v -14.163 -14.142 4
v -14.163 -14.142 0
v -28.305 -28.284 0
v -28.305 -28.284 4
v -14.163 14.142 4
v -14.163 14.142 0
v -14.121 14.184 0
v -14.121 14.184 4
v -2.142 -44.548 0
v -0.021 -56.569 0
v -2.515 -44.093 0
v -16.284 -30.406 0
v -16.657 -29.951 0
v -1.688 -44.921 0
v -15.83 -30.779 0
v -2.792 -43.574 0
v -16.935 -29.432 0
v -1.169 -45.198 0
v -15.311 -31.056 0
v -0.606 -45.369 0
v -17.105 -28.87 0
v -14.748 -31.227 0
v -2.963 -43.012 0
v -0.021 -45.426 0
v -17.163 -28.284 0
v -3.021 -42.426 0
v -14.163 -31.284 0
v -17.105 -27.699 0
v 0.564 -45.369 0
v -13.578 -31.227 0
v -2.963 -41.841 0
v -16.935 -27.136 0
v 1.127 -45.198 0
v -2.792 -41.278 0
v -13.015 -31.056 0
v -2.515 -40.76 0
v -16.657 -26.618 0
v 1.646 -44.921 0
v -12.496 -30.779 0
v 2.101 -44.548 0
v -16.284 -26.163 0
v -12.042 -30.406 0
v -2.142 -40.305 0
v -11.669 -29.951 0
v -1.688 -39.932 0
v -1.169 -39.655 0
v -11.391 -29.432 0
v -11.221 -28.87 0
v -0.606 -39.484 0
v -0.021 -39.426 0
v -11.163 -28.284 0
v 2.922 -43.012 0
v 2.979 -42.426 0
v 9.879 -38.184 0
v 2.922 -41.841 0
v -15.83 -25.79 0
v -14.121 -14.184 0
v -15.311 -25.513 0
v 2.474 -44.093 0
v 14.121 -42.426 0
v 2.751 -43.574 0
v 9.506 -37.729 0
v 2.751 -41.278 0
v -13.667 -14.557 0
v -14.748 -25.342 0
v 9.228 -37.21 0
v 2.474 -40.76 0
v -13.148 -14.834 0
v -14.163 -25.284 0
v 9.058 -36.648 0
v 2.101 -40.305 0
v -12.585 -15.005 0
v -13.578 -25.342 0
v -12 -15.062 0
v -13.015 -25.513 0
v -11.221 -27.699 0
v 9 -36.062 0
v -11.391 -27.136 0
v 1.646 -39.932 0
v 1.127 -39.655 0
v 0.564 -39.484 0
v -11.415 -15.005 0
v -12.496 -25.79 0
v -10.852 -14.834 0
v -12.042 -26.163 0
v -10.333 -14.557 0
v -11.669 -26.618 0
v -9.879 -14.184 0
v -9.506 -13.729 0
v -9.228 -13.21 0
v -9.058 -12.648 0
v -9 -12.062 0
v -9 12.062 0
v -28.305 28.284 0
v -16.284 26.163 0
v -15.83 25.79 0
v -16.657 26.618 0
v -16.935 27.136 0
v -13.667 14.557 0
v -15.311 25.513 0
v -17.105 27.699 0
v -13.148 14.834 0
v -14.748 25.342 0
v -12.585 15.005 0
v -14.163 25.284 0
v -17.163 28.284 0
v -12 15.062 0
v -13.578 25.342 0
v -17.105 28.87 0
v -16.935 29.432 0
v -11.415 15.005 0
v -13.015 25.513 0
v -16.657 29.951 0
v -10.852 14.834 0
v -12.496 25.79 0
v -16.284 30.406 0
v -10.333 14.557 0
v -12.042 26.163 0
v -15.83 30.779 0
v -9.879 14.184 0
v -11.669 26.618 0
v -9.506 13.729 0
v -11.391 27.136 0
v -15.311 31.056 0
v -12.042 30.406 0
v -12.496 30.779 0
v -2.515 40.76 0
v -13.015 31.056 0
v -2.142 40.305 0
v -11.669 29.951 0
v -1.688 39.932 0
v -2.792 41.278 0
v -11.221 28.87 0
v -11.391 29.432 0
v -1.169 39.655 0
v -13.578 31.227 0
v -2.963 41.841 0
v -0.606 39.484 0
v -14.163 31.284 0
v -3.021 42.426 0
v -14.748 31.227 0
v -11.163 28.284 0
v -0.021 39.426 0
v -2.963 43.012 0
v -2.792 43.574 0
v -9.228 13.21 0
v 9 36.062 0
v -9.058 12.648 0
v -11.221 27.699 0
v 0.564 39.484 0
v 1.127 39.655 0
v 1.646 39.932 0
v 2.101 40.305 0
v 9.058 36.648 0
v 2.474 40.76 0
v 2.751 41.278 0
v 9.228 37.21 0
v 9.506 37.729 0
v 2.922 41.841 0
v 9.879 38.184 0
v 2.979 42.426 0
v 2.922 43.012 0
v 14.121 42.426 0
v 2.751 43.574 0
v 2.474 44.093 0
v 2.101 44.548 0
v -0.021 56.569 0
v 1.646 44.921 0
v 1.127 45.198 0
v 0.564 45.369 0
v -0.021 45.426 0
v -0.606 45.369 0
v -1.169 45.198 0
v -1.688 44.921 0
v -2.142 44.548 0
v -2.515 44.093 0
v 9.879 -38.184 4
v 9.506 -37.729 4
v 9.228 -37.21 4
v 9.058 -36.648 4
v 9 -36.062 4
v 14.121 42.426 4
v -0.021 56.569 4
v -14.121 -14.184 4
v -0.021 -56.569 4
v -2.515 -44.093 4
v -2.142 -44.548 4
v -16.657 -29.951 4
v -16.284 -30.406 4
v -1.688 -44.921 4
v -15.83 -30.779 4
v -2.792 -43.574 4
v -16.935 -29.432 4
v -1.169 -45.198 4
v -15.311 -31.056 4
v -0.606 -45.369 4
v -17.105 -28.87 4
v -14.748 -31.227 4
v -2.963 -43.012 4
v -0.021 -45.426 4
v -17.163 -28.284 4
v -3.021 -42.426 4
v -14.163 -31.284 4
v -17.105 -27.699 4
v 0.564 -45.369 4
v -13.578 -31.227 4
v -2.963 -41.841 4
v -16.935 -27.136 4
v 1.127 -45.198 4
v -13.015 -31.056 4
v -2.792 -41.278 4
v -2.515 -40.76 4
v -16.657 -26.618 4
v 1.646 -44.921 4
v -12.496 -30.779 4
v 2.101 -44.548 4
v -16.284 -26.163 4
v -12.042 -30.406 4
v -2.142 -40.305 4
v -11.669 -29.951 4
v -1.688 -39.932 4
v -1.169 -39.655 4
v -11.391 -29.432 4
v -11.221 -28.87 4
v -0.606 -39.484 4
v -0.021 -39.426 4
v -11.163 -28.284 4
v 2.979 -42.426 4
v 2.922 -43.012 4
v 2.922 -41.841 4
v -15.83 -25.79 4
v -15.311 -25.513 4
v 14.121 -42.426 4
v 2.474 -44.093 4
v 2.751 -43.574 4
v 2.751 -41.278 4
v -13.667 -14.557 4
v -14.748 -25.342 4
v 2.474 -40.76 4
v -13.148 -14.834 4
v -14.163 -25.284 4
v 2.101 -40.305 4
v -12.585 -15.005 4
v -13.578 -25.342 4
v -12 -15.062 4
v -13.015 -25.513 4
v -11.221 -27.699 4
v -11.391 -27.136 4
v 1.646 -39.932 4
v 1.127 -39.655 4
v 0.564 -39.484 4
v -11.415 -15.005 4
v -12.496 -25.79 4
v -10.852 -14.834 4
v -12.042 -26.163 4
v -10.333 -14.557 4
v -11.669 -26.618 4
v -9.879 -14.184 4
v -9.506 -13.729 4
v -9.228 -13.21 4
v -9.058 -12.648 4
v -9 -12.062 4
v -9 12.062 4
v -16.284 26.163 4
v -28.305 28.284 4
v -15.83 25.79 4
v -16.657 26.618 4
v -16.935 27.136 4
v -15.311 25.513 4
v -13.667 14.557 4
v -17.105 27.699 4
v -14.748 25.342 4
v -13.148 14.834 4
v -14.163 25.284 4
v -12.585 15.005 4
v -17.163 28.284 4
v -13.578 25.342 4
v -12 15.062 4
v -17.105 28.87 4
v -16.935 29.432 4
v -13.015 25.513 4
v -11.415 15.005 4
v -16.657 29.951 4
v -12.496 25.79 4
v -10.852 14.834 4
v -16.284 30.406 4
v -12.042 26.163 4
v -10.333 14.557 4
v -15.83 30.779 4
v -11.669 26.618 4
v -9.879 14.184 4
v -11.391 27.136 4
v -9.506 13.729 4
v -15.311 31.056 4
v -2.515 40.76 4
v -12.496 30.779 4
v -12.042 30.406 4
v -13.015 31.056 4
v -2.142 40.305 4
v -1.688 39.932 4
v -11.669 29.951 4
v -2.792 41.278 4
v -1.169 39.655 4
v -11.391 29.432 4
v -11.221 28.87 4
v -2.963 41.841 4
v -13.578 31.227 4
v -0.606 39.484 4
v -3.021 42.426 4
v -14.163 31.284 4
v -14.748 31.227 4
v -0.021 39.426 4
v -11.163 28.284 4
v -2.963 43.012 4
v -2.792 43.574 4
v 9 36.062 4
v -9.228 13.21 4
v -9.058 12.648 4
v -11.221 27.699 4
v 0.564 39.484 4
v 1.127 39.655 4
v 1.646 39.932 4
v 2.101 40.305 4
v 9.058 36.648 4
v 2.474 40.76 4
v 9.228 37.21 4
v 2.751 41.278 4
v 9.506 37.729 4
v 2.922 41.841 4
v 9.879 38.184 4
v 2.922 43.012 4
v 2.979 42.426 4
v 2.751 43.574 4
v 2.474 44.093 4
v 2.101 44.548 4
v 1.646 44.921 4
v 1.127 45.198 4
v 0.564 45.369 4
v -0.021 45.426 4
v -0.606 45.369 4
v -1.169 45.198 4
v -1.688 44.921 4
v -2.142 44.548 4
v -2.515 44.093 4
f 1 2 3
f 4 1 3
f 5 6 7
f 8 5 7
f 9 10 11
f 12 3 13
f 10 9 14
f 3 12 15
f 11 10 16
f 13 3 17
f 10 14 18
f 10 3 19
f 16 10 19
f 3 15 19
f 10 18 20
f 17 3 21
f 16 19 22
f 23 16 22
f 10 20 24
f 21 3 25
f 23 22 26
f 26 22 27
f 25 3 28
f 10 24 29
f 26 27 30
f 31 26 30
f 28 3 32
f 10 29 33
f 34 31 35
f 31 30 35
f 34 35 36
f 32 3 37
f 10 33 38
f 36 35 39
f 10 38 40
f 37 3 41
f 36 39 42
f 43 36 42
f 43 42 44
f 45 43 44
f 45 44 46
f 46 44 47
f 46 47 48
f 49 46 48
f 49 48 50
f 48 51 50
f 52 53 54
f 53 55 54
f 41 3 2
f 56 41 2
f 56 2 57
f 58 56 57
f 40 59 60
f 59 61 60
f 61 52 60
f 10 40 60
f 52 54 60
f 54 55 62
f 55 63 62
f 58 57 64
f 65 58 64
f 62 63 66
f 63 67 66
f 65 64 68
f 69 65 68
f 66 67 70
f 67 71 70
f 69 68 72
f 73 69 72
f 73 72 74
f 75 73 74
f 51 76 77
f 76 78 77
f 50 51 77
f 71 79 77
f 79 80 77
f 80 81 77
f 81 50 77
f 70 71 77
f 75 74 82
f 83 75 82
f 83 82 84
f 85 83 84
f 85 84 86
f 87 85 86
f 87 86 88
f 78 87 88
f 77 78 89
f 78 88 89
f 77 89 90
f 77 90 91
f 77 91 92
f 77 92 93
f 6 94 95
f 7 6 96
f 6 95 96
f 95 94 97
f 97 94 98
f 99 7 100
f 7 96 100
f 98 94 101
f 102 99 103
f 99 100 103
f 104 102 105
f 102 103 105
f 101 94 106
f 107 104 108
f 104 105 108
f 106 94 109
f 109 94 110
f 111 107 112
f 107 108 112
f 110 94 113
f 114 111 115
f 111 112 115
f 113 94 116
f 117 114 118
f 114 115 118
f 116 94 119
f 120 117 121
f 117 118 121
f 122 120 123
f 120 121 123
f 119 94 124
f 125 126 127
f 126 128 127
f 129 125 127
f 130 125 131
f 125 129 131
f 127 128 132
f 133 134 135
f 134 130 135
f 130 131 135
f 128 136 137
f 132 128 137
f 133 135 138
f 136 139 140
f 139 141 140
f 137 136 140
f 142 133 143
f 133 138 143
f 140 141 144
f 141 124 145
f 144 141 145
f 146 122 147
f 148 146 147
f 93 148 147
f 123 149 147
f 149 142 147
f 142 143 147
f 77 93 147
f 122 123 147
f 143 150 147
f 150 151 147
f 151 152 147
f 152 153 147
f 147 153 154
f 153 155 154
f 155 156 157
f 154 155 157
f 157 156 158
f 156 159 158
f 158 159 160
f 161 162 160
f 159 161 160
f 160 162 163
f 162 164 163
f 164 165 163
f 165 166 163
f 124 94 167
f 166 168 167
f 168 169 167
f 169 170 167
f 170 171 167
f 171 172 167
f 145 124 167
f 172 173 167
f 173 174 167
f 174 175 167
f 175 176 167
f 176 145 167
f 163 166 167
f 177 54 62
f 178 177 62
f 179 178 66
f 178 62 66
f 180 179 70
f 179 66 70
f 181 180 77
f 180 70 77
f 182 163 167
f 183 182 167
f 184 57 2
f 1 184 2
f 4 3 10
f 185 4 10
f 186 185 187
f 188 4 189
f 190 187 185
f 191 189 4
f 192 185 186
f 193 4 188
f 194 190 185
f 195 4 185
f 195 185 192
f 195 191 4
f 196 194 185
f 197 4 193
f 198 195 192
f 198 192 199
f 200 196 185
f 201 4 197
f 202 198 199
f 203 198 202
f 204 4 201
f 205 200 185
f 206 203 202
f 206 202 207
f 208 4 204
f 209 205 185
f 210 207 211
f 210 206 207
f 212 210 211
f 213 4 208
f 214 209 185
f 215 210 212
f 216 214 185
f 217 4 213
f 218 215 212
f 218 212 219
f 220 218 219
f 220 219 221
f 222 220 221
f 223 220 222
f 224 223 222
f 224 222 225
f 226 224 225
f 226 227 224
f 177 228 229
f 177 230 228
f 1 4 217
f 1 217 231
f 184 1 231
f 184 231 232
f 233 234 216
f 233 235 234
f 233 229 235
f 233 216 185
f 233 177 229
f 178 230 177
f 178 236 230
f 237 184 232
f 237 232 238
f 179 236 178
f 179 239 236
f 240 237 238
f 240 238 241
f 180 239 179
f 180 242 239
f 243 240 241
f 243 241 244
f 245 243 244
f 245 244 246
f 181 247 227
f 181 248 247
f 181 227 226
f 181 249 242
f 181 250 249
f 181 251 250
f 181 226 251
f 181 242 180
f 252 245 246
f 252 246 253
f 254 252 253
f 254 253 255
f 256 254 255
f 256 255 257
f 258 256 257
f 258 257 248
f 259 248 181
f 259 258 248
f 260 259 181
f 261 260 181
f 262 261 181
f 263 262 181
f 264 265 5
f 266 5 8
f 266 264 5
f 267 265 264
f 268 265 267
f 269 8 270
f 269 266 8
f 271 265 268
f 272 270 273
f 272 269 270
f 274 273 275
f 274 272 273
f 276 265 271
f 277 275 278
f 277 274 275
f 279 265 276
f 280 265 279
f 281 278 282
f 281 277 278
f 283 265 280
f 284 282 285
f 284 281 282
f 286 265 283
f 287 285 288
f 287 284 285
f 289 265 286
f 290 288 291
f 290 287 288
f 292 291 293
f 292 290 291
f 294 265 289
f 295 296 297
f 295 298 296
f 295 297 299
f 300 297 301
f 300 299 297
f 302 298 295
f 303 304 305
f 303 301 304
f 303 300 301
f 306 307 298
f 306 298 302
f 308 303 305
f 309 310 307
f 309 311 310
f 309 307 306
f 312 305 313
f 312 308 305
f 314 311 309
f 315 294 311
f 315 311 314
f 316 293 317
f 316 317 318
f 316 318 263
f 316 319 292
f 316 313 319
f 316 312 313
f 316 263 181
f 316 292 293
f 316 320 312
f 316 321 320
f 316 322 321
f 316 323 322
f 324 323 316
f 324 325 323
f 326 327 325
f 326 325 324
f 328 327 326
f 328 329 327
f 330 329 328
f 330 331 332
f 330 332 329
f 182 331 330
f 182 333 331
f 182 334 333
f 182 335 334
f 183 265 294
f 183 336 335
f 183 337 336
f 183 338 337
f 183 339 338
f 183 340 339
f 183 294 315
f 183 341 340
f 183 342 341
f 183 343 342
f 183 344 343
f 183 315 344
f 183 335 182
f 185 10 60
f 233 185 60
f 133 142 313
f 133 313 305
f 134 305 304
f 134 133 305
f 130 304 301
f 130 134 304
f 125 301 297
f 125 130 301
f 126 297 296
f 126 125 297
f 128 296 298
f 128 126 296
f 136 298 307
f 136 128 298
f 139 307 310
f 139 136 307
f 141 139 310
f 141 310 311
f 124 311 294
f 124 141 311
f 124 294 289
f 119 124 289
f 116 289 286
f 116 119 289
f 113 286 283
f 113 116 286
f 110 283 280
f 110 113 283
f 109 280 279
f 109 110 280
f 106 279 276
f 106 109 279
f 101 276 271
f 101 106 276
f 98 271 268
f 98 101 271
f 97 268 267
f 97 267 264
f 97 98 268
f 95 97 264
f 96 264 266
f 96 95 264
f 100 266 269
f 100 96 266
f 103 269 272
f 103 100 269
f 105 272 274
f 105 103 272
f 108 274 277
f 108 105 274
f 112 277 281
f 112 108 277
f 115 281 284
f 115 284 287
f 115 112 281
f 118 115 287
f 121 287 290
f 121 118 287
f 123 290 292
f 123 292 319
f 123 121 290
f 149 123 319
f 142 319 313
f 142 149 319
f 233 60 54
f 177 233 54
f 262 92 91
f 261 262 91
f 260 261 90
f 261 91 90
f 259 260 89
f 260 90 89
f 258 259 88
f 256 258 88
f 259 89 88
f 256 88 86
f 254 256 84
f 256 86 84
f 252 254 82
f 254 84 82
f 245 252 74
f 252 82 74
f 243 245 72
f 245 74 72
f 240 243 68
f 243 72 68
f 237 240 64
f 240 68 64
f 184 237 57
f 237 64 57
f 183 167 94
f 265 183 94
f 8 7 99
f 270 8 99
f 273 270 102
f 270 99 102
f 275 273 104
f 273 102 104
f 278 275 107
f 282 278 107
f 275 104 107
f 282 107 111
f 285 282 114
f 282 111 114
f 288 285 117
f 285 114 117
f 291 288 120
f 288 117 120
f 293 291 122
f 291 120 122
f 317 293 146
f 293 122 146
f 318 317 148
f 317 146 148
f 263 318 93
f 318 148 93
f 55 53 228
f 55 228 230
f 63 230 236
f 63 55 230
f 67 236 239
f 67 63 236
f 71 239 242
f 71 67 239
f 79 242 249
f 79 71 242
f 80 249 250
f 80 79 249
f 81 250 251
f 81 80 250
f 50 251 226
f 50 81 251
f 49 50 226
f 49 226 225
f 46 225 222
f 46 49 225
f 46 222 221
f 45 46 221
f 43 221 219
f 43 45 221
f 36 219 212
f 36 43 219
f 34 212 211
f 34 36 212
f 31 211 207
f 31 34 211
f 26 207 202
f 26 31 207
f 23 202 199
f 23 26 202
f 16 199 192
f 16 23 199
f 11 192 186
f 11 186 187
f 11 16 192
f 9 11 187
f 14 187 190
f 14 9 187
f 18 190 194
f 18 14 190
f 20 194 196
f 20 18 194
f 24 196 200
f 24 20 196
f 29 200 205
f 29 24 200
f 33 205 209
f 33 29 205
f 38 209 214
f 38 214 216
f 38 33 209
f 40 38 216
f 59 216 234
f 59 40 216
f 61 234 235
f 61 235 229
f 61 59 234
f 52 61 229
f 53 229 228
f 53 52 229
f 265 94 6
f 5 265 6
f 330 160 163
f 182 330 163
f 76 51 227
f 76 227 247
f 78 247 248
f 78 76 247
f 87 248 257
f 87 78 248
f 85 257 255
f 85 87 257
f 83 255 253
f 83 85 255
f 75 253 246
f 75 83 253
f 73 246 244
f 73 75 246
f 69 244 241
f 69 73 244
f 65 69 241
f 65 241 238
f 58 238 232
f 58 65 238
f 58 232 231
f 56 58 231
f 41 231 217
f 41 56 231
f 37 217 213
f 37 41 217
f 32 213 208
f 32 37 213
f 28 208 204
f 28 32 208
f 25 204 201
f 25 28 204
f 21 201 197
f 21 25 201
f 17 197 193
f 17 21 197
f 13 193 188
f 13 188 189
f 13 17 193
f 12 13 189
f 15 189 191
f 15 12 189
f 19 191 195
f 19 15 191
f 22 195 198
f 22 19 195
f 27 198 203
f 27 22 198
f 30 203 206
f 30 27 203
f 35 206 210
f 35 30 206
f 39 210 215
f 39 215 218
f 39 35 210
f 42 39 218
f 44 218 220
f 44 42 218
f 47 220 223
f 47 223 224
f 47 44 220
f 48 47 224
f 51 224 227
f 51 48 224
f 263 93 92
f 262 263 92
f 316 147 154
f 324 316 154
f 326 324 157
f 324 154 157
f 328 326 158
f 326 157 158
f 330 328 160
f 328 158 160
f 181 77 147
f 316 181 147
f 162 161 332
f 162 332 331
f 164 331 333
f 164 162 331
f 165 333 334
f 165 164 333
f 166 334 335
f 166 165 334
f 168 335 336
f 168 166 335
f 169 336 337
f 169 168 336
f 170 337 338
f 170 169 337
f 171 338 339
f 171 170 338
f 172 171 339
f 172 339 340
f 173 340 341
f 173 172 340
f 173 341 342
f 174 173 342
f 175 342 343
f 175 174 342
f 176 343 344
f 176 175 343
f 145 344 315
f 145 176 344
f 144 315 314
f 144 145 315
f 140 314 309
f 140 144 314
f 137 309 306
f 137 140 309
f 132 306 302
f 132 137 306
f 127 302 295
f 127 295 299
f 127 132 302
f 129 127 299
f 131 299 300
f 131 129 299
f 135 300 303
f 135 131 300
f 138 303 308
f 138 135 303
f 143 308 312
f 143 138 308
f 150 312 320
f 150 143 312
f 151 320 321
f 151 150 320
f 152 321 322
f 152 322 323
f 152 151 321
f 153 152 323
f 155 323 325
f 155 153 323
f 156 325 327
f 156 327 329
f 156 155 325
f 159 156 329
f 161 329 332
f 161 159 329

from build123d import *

# Parameters (mm, degrees)
SKETCH1_R           = 3
BOSS_EXTRUDE1_DEPTH = 4


with BuildPart() as part:
    # Sketch1 → Boss-Extrude1 (new body)
    with BuildSketch(Plane.XY):
        with BuildLine():
            Line((-14.162950904, 14.142135624), (-14.121320344, 14.183766184))
            ThreePointArc((-14.121320344, 14.183766184), (-10.851949703, 14.834084438), (-9, 12.062445841))
            Line((-9, 12.062445841), (-9, -12.062445841))
            ThreePointArc((-9, -12.062445841), (-10.851949703, -14.834084438), (-14.121320344, -14.183766184))
            Line((-14.121320344, -14.183766184), (-14.162950904, -14.142135624))
            Line((-14.162950904, -14.142135624), (-28.305086528, -28.284271247))
            Line((-28.305086528, -28.284271247), (-0.02081528, -56.568542495))
            Line((-0.02081528, -56.568542495), (14.121320344, -42.426406871))
            Line((14.121320344, -42.426406871), (9.878679656, -38.183766184))
            ThreePointArc((9.878679656, -38.183766184), (9.228361402, -37.210496138), (9, -36.062445841))
            Line((9, -36.062445841), (9, 36.062445841))
            ThreePointArc((9, 36.062445841), (9.228361402, 37.210496138), (9.878679656, 38.183766184))
            Line((9.878679656, 38.183766184), (14.121320344, 42.426406871))
            Line((14.121320344, 42.426406871), (-0.02081528, 56.568542495))
            Line((-0.02081528, 56.568542495), (-28.305086528, 28.284271247))
            Line((-28.305086528, 28.284271247), (-14.162950904, 14.142135624))
        make_face()
        with Locations((-0.02081528, 42.426406871)):
            Circle(SKETCH1_R, mode=Mode.SUBTRACT)
        with Locations((-14.162950904, 28.284271247)):
            Circle(SKETCH1_R, mode=Mode.SUBTRACT)
        with Locations((-14.162950904, -28.284271247)):
            Circle(SKETCH1_R, mode=Mode.SUBTRACT)
        with Locations((-0.02081528, -42.426406871)):
            Circle(SKETCH1_R, mode=Mode.SUBTRACT)
    extrude(amount=BOSS_EXTRUDE1_DEPTH)


solid = part.part
